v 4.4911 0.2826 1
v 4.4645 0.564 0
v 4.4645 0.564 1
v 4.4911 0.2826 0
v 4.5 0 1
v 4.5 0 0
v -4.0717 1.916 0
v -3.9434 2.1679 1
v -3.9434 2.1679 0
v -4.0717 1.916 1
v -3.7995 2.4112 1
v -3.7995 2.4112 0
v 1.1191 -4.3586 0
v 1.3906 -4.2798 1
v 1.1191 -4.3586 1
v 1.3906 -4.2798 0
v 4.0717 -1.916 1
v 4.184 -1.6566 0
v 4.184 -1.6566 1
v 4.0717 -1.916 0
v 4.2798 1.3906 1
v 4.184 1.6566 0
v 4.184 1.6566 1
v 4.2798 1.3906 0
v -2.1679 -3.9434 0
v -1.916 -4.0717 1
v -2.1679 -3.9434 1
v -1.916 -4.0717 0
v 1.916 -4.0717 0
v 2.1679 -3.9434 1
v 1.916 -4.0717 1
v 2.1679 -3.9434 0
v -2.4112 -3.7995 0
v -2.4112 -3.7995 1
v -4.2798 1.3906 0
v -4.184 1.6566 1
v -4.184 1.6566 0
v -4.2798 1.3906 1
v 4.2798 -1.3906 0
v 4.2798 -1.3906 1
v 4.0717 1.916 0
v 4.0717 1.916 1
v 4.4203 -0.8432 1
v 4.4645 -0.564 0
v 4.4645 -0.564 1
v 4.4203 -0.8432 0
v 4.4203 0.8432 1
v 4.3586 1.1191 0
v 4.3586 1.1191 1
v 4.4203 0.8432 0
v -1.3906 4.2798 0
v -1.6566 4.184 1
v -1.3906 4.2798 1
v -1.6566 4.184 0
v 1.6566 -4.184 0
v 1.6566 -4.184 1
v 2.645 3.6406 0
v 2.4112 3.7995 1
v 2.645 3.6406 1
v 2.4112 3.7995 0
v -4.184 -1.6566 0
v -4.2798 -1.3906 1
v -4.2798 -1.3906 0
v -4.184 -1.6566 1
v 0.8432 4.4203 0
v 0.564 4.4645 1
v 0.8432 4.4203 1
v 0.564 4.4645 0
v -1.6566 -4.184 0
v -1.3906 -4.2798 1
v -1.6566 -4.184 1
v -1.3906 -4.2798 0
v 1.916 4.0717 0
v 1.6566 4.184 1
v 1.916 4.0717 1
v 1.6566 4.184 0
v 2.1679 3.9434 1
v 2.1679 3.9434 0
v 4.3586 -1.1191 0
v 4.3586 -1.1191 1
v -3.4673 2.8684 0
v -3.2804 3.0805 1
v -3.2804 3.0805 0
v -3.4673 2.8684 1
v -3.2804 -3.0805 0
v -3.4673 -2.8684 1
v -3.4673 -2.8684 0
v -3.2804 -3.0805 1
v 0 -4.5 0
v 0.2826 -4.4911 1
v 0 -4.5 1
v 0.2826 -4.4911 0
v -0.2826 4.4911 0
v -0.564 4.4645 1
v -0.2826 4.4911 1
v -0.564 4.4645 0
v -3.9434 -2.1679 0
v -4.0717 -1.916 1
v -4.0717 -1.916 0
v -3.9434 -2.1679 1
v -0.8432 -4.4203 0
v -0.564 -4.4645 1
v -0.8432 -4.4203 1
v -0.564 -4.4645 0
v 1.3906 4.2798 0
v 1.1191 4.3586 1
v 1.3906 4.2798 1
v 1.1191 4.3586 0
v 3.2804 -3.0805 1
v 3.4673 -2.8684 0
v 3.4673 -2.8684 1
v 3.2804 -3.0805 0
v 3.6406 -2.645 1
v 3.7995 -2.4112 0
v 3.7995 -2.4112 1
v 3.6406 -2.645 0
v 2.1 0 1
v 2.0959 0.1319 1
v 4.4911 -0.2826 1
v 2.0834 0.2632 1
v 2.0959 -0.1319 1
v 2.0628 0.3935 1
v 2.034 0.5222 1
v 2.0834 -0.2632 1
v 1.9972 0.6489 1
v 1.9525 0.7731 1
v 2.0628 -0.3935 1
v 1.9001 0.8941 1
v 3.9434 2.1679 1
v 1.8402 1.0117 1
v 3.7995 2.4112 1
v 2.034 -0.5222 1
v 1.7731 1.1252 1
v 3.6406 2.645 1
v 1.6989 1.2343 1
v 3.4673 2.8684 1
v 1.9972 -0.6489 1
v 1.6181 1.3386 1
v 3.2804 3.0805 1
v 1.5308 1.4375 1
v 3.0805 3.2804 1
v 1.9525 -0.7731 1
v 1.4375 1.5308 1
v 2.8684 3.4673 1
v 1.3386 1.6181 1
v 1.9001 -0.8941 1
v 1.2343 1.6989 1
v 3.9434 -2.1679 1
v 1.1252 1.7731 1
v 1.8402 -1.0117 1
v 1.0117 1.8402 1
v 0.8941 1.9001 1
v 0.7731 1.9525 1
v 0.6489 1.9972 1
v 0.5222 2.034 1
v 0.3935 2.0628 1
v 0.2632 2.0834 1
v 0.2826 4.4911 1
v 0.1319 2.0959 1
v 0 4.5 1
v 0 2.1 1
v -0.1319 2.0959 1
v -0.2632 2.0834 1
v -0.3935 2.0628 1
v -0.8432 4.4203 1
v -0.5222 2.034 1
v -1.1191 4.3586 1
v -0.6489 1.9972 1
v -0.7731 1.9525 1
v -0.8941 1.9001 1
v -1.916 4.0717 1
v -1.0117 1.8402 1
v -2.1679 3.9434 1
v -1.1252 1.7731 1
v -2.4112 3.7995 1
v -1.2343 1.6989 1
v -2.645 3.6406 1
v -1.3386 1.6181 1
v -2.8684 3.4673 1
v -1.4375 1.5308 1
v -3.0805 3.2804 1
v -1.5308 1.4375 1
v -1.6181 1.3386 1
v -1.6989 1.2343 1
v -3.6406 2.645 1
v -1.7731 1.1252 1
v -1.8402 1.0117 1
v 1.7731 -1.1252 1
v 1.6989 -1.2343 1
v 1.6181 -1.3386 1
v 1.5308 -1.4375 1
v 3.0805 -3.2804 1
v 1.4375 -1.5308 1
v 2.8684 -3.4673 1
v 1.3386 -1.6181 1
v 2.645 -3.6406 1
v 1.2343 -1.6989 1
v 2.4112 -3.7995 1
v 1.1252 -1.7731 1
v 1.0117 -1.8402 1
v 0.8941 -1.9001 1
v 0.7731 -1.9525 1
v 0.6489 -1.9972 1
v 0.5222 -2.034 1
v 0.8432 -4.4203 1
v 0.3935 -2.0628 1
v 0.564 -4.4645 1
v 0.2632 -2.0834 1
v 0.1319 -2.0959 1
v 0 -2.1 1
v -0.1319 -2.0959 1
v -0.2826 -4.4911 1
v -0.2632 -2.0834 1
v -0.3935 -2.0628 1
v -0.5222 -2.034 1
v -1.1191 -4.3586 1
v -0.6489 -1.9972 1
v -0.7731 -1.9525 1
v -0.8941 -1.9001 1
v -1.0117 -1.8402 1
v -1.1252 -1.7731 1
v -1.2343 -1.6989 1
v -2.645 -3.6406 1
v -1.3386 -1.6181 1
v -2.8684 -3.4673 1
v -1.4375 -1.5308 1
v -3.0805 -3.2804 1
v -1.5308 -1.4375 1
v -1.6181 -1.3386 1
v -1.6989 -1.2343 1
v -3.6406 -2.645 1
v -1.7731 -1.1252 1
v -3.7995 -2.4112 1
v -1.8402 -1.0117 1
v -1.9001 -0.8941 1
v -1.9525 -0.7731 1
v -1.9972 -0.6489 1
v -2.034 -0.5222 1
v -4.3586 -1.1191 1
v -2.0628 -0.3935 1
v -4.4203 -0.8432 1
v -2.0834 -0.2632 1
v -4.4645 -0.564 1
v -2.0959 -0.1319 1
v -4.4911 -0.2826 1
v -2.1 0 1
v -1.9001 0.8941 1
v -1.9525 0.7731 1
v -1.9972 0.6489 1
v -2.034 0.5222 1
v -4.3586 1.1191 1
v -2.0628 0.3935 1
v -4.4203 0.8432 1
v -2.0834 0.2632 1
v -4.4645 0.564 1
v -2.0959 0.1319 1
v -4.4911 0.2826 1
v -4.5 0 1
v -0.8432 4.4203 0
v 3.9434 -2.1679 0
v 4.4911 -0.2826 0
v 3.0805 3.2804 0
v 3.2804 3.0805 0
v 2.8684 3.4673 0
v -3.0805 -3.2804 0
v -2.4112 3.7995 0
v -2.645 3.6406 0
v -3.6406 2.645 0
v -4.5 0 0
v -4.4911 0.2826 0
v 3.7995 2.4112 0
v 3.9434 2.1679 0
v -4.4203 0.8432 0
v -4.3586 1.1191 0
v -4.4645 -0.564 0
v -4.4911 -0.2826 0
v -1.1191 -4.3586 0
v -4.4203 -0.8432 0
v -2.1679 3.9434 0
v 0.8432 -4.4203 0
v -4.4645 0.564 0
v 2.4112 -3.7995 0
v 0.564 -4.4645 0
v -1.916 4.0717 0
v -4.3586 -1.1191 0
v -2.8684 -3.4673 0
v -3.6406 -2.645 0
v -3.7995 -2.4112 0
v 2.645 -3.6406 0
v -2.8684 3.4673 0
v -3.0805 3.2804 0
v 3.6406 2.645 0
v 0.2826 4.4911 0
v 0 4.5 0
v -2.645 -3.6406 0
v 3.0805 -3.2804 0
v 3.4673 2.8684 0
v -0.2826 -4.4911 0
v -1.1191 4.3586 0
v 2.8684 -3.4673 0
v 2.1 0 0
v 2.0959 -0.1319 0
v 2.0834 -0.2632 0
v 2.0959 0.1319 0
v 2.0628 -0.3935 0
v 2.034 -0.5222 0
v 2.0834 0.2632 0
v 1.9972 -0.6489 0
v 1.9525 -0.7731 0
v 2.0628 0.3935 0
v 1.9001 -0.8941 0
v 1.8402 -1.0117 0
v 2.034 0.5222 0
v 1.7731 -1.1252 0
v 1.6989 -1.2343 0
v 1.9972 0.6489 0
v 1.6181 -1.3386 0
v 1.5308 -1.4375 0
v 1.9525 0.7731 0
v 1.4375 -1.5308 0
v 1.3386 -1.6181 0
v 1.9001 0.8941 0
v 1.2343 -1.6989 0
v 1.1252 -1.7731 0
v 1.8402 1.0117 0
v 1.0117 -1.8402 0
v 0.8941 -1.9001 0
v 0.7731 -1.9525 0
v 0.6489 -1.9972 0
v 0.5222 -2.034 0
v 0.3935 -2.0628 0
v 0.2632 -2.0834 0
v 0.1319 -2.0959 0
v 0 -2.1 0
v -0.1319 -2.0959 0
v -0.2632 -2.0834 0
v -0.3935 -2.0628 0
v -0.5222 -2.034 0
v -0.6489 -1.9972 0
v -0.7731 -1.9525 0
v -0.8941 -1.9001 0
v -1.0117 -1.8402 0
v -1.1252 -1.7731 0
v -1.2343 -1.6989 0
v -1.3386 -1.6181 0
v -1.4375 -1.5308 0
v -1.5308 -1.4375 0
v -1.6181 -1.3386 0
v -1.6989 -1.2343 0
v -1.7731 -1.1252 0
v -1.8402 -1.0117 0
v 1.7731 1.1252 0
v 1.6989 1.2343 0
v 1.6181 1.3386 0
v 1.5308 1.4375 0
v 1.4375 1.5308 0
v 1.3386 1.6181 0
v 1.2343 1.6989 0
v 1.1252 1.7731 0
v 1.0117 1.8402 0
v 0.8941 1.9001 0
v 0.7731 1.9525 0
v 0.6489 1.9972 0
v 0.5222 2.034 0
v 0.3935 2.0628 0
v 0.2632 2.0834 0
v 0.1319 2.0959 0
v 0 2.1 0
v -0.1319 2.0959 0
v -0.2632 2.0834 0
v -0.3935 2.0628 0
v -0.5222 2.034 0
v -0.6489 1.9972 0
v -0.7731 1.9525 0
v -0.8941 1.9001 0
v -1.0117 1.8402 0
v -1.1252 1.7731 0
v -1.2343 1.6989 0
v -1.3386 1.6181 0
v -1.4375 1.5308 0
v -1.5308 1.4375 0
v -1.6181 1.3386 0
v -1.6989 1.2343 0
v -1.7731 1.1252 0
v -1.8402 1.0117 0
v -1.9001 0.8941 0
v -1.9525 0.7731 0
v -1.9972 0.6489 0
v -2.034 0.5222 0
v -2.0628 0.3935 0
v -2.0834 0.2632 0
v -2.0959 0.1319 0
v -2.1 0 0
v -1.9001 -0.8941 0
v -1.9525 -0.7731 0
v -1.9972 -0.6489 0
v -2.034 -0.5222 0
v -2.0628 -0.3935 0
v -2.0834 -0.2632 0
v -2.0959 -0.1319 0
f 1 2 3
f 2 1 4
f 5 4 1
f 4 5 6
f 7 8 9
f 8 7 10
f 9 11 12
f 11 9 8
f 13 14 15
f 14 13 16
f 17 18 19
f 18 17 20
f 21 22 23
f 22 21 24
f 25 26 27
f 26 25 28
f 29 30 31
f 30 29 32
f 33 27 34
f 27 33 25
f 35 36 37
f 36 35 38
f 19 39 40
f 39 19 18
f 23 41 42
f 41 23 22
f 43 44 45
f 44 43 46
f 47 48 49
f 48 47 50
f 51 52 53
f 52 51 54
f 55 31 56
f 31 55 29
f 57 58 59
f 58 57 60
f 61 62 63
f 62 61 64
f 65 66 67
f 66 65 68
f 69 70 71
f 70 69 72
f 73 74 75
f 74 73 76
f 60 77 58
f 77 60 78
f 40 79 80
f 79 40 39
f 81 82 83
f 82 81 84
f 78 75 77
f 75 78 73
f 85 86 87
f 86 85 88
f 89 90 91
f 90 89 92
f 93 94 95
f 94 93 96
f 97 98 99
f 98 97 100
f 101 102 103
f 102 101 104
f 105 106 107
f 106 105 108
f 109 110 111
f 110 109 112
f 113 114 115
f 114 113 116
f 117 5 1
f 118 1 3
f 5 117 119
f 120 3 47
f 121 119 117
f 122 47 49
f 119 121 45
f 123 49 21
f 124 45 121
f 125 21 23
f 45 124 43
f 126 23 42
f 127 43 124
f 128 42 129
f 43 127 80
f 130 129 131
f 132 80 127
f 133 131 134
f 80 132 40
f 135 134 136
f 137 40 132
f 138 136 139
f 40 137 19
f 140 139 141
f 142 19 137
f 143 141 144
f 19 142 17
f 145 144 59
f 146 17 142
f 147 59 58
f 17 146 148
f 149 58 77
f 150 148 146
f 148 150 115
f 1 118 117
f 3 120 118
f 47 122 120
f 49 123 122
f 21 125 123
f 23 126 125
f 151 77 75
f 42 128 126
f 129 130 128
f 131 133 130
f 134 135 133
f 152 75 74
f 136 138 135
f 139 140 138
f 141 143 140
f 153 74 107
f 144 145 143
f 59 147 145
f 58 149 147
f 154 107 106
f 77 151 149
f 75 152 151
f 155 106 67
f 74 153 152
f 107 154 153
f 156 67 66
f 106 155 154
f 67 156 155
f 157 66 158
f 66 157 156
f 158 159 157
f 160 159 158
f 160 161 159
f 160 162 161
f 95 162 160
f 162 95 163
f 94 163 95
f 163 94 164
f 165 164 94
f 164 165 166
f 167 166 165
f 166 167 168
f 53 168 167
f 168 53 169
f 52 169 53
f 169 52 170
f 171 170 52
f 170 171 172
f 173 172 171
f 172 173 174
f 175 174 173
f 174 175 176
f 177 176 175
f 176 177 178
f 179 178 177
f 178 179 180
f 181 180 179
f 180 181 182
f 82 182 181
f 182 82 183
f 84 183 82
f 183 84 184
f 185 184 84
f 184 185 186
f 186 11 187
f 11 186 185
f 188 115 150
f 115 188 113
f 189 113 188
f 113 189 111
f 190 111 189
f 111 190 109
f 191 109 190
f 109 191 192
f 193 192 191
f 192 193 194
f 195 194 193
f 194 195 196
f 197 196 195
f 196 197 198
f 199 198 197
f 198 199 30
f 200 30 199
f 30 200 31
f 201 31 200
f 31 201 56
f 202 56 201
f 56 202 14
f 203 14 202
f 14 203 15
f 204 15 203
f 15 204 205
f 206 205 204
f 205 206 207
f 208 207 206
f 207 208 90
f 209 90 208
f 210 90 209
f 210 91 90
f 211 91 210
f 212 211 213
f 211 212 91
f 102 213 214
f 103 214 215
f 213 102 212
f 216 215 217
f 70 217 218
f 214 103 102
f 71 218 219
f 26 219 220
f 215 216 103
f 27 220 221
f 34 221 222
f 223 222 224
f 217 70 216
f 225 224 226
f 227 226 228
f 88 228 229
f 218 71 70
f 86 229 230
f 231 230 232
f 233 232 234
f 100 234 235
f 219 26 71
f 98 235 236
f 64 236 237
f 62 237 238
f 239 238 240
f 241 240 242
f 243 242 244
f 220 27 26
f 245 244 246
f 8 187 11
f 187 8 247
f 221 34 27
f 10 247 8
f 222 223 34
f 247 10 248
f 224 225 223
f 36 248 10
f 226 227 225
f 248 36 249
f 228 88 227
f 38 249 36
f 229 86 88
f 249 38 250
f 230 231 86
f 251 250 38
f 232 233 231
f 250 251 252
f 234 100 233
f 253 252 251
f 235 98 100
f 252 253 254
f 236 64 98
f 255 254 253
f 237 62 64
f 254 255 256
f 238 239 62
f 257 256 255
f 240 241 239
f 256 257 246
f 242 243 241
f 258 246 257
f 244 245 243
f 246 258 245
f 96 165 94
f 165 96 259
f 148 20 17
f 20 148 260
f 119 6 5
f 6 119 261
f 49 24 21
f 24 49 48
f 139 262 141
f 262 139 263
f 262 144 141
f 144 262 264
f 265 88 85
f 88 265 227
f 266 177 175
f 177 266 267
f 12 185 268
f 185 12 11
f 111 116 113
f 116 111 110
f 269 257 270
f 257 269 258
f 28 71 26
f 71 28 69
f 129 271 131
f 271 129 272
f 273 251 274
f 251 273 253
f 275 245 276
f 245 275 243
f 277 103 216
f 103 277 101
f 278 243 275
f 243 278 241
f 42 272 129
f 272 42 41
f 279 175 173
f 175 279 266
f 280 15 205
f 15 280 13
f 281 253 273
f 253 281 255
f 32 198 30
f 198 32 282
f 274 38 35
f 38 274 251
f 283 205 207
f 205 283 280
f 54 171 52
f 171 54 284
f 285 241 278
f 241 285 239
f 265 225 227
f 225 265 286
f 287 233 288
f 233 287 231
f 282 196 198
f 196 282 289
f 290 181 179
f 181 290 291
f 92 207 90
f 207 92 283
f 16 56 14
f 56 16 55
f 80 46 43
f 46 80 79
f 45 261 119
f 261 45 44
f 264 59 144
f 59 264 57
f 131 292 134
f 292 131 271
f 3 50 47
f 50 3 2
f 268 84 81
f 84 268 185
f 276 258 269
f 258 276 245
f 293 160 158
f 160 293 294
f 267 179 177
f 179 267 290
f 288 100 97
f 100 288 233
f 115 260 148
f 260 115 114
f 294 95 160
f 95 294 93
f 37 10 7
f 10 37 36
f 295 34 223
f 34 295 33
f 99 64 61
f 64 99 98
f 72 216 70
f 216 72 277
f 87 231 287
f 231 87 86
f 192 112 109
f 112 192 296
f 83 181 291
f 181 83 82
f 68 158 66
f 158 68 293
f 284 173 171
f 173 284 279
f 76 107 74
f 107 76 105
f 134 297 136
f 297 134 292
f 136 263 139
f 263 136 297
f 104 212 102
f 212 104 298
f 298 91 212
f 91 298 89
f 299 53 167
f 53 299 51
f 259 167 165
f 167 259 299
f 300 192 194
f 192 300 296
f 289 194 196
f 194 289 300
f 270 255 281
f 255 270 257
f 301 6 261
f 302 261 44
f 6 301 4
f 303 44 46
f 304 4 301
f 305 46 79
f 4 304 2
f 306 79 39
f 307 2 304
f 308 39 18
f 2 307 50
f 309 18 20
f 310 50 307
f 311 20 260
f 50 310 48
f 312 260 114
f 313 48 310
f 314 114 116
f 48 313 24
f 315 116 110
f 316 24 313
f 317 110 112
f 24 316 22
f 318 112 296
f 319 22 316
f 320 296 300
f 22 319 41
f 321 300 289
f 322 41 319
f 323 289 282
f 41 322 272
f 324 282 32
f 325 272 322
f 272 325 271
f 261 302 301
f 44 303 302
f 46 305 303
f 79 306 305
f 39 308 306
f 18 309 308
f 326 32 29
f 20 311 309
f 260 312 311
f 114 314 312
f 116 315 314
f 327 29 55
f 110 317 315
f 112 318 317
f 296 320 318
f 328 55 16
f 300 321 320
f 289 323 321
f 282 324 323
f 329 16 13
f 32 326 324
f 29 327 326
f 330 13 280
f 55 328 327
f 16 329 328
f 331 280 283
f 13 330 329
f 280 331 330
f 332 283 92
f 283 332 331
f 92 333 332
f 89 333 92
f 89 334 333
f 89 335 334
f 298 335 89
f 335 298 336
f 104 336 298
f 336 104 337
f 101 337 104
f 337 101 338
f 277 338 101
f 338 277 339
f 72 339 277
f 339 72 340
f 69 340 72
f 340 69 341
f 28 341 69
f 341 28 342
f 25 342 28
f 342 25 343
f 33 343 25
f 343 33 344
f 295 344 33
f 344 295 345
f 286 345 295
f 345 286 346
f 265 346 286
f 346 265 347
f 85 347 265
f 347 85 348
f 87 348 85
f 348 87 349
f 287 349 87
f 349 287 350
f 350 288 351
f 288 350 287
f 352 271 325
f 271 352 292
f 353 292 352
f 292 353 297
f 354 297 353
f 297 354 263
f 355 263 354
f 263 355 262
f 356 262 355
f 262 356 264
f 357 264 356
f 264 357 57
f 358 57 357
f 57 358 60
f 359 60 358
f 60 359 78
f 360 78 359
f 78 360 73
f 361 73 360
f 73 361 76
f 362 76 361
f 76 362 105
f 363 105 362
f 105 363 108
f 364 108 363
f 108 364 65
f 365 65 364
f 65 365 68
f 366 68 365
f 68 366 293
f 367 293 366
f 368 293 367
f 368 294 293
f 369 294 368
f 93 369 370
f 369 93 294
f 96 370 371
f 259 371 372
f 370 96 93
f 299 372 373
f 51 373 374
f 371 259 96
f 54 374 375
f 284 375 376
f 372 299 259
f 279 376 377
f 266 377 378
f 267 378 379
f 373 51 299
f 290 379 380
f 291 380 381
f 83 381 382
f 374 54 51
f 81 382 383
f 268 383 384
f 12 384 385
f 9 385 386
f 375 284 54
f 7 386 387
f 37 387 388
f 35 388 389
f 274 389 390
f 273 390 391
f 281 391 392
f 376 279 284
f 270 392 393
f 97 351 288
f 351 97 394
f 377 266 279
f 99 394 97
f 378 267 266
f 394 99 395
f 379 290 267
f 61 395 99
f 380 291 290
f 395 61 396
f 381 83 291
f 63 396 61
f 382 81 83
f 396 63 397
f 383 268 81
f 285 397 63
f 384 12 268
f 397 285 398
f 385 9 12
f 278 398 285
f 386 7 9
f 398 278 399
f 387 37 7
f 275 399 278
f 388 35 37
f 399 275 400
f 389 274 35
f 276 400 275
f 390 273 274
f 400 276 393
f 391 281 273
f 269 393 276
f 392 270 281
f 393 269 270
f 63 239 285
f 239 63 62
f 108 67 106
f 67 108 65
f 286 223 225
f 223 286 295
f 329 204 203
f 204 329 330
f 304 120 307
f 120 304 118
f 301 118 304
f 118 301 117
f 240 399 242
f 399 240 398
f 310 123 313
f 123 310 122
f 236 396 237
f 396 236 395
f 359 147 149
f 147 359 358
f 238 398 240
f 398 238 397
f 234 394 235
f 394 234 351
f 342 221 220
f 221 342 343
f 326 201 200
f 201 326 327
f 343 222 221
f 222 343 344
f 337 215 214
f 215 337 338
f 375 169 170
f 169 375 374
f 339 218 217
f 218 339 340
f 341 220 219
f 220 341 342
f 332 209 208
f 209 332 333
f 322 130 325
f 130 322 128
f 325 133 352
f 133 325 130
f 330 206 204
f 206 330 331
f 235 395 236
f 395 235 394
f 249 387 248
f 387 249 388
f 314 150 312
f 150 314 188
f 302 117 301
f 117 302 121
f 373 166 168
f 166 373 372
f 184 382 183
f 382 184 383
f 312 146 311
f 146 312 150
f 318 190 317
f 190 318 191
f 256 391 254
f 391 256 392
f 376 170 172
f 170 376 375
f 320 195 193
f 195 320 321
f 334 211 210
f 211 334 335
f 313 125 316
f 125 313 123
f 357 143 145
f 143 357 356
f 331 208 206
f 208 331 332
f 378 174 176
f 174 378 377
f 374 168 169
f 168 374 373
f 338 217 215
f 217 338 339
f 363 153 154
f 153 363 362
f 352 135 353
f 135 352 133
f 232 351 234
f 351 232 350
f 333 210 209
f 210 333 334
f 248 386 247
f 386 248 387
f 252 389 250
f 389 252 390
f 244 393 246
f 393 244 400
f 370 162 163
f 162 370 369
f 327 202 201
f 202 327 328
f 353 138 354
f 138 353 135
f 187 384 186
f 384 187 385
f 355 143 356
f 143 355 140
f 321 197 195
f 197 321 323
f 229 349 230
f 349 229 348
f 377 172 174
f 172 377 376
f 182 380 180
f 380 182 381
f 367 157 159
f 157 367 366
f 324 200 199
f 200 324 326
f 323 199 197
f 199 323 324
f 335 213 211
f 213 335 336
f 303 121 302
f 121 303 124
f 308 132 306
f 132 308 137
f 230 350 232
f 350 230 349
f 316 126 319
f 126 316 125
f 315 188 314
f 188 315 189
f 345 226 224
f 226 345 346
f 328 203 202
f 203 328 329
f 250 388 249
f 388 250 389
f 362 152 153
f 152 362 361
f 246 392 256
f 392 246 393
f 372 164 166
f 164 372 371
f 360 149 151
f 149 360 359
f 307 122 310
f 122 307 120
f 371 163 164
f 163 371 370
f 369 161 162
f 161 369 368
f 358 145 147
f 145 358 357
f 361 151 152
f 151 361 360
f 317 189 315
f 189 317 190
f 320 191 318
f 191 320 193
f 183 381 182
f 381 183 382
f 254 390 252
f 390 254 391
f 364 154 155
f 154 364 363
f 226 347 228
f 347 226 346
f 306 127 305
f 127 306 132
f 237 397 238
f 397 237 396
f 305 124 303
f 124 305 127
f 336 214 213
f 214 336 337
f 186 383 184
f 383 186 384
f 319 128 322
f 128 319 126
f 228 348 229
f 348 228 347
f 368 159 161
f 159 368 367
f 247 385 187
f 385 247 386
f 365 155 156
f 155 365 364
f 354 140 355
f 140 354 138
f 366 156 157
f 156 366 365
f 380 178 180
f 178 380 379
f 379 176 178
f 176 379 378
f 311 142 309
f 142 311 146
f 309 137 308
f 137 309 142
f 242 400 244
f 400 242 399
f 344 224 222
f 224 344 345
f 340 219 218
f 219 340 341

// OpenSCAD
// ============================================
// FICHIER : rondelle.scad
// DESCRIPTION : Modèle 3D d'une rondelle plate.
//               Utilisée pour répartir la charge sous une vis.
// ============================================

// ----------------------------
// 1. DIMENSIONS DE LA RONDELLE
// ----------------------------
// Diamètre extérieur de la rondelle (en mm)
dx = 9;

// Diamètre du trou central (en mm)
dt = 4.2;

// Épaisseur de la rondelle (en mm)
de = 1;

// ----------------------------
// 2. QUALITÉ DE RENDU
// ----------------------------
$fn = 100;


// ============================================
// CONSTRUCTION PRINCIPALE
// ============================================

difference() {
  // ----------------------------
  // Forme de base : cylindre (rondelle)
  // ----------------------------
  cylinder(d = dx, h = de);
  
  // ----------------------------
  // Évidement : trou central
  // ----------------------------
  // Trou traversant (3 fois l'épaisseur pour garantir la pénétration)
  translate([0, 0, -de]) 
    cylinder(d = dt, h = 3*de);
}
